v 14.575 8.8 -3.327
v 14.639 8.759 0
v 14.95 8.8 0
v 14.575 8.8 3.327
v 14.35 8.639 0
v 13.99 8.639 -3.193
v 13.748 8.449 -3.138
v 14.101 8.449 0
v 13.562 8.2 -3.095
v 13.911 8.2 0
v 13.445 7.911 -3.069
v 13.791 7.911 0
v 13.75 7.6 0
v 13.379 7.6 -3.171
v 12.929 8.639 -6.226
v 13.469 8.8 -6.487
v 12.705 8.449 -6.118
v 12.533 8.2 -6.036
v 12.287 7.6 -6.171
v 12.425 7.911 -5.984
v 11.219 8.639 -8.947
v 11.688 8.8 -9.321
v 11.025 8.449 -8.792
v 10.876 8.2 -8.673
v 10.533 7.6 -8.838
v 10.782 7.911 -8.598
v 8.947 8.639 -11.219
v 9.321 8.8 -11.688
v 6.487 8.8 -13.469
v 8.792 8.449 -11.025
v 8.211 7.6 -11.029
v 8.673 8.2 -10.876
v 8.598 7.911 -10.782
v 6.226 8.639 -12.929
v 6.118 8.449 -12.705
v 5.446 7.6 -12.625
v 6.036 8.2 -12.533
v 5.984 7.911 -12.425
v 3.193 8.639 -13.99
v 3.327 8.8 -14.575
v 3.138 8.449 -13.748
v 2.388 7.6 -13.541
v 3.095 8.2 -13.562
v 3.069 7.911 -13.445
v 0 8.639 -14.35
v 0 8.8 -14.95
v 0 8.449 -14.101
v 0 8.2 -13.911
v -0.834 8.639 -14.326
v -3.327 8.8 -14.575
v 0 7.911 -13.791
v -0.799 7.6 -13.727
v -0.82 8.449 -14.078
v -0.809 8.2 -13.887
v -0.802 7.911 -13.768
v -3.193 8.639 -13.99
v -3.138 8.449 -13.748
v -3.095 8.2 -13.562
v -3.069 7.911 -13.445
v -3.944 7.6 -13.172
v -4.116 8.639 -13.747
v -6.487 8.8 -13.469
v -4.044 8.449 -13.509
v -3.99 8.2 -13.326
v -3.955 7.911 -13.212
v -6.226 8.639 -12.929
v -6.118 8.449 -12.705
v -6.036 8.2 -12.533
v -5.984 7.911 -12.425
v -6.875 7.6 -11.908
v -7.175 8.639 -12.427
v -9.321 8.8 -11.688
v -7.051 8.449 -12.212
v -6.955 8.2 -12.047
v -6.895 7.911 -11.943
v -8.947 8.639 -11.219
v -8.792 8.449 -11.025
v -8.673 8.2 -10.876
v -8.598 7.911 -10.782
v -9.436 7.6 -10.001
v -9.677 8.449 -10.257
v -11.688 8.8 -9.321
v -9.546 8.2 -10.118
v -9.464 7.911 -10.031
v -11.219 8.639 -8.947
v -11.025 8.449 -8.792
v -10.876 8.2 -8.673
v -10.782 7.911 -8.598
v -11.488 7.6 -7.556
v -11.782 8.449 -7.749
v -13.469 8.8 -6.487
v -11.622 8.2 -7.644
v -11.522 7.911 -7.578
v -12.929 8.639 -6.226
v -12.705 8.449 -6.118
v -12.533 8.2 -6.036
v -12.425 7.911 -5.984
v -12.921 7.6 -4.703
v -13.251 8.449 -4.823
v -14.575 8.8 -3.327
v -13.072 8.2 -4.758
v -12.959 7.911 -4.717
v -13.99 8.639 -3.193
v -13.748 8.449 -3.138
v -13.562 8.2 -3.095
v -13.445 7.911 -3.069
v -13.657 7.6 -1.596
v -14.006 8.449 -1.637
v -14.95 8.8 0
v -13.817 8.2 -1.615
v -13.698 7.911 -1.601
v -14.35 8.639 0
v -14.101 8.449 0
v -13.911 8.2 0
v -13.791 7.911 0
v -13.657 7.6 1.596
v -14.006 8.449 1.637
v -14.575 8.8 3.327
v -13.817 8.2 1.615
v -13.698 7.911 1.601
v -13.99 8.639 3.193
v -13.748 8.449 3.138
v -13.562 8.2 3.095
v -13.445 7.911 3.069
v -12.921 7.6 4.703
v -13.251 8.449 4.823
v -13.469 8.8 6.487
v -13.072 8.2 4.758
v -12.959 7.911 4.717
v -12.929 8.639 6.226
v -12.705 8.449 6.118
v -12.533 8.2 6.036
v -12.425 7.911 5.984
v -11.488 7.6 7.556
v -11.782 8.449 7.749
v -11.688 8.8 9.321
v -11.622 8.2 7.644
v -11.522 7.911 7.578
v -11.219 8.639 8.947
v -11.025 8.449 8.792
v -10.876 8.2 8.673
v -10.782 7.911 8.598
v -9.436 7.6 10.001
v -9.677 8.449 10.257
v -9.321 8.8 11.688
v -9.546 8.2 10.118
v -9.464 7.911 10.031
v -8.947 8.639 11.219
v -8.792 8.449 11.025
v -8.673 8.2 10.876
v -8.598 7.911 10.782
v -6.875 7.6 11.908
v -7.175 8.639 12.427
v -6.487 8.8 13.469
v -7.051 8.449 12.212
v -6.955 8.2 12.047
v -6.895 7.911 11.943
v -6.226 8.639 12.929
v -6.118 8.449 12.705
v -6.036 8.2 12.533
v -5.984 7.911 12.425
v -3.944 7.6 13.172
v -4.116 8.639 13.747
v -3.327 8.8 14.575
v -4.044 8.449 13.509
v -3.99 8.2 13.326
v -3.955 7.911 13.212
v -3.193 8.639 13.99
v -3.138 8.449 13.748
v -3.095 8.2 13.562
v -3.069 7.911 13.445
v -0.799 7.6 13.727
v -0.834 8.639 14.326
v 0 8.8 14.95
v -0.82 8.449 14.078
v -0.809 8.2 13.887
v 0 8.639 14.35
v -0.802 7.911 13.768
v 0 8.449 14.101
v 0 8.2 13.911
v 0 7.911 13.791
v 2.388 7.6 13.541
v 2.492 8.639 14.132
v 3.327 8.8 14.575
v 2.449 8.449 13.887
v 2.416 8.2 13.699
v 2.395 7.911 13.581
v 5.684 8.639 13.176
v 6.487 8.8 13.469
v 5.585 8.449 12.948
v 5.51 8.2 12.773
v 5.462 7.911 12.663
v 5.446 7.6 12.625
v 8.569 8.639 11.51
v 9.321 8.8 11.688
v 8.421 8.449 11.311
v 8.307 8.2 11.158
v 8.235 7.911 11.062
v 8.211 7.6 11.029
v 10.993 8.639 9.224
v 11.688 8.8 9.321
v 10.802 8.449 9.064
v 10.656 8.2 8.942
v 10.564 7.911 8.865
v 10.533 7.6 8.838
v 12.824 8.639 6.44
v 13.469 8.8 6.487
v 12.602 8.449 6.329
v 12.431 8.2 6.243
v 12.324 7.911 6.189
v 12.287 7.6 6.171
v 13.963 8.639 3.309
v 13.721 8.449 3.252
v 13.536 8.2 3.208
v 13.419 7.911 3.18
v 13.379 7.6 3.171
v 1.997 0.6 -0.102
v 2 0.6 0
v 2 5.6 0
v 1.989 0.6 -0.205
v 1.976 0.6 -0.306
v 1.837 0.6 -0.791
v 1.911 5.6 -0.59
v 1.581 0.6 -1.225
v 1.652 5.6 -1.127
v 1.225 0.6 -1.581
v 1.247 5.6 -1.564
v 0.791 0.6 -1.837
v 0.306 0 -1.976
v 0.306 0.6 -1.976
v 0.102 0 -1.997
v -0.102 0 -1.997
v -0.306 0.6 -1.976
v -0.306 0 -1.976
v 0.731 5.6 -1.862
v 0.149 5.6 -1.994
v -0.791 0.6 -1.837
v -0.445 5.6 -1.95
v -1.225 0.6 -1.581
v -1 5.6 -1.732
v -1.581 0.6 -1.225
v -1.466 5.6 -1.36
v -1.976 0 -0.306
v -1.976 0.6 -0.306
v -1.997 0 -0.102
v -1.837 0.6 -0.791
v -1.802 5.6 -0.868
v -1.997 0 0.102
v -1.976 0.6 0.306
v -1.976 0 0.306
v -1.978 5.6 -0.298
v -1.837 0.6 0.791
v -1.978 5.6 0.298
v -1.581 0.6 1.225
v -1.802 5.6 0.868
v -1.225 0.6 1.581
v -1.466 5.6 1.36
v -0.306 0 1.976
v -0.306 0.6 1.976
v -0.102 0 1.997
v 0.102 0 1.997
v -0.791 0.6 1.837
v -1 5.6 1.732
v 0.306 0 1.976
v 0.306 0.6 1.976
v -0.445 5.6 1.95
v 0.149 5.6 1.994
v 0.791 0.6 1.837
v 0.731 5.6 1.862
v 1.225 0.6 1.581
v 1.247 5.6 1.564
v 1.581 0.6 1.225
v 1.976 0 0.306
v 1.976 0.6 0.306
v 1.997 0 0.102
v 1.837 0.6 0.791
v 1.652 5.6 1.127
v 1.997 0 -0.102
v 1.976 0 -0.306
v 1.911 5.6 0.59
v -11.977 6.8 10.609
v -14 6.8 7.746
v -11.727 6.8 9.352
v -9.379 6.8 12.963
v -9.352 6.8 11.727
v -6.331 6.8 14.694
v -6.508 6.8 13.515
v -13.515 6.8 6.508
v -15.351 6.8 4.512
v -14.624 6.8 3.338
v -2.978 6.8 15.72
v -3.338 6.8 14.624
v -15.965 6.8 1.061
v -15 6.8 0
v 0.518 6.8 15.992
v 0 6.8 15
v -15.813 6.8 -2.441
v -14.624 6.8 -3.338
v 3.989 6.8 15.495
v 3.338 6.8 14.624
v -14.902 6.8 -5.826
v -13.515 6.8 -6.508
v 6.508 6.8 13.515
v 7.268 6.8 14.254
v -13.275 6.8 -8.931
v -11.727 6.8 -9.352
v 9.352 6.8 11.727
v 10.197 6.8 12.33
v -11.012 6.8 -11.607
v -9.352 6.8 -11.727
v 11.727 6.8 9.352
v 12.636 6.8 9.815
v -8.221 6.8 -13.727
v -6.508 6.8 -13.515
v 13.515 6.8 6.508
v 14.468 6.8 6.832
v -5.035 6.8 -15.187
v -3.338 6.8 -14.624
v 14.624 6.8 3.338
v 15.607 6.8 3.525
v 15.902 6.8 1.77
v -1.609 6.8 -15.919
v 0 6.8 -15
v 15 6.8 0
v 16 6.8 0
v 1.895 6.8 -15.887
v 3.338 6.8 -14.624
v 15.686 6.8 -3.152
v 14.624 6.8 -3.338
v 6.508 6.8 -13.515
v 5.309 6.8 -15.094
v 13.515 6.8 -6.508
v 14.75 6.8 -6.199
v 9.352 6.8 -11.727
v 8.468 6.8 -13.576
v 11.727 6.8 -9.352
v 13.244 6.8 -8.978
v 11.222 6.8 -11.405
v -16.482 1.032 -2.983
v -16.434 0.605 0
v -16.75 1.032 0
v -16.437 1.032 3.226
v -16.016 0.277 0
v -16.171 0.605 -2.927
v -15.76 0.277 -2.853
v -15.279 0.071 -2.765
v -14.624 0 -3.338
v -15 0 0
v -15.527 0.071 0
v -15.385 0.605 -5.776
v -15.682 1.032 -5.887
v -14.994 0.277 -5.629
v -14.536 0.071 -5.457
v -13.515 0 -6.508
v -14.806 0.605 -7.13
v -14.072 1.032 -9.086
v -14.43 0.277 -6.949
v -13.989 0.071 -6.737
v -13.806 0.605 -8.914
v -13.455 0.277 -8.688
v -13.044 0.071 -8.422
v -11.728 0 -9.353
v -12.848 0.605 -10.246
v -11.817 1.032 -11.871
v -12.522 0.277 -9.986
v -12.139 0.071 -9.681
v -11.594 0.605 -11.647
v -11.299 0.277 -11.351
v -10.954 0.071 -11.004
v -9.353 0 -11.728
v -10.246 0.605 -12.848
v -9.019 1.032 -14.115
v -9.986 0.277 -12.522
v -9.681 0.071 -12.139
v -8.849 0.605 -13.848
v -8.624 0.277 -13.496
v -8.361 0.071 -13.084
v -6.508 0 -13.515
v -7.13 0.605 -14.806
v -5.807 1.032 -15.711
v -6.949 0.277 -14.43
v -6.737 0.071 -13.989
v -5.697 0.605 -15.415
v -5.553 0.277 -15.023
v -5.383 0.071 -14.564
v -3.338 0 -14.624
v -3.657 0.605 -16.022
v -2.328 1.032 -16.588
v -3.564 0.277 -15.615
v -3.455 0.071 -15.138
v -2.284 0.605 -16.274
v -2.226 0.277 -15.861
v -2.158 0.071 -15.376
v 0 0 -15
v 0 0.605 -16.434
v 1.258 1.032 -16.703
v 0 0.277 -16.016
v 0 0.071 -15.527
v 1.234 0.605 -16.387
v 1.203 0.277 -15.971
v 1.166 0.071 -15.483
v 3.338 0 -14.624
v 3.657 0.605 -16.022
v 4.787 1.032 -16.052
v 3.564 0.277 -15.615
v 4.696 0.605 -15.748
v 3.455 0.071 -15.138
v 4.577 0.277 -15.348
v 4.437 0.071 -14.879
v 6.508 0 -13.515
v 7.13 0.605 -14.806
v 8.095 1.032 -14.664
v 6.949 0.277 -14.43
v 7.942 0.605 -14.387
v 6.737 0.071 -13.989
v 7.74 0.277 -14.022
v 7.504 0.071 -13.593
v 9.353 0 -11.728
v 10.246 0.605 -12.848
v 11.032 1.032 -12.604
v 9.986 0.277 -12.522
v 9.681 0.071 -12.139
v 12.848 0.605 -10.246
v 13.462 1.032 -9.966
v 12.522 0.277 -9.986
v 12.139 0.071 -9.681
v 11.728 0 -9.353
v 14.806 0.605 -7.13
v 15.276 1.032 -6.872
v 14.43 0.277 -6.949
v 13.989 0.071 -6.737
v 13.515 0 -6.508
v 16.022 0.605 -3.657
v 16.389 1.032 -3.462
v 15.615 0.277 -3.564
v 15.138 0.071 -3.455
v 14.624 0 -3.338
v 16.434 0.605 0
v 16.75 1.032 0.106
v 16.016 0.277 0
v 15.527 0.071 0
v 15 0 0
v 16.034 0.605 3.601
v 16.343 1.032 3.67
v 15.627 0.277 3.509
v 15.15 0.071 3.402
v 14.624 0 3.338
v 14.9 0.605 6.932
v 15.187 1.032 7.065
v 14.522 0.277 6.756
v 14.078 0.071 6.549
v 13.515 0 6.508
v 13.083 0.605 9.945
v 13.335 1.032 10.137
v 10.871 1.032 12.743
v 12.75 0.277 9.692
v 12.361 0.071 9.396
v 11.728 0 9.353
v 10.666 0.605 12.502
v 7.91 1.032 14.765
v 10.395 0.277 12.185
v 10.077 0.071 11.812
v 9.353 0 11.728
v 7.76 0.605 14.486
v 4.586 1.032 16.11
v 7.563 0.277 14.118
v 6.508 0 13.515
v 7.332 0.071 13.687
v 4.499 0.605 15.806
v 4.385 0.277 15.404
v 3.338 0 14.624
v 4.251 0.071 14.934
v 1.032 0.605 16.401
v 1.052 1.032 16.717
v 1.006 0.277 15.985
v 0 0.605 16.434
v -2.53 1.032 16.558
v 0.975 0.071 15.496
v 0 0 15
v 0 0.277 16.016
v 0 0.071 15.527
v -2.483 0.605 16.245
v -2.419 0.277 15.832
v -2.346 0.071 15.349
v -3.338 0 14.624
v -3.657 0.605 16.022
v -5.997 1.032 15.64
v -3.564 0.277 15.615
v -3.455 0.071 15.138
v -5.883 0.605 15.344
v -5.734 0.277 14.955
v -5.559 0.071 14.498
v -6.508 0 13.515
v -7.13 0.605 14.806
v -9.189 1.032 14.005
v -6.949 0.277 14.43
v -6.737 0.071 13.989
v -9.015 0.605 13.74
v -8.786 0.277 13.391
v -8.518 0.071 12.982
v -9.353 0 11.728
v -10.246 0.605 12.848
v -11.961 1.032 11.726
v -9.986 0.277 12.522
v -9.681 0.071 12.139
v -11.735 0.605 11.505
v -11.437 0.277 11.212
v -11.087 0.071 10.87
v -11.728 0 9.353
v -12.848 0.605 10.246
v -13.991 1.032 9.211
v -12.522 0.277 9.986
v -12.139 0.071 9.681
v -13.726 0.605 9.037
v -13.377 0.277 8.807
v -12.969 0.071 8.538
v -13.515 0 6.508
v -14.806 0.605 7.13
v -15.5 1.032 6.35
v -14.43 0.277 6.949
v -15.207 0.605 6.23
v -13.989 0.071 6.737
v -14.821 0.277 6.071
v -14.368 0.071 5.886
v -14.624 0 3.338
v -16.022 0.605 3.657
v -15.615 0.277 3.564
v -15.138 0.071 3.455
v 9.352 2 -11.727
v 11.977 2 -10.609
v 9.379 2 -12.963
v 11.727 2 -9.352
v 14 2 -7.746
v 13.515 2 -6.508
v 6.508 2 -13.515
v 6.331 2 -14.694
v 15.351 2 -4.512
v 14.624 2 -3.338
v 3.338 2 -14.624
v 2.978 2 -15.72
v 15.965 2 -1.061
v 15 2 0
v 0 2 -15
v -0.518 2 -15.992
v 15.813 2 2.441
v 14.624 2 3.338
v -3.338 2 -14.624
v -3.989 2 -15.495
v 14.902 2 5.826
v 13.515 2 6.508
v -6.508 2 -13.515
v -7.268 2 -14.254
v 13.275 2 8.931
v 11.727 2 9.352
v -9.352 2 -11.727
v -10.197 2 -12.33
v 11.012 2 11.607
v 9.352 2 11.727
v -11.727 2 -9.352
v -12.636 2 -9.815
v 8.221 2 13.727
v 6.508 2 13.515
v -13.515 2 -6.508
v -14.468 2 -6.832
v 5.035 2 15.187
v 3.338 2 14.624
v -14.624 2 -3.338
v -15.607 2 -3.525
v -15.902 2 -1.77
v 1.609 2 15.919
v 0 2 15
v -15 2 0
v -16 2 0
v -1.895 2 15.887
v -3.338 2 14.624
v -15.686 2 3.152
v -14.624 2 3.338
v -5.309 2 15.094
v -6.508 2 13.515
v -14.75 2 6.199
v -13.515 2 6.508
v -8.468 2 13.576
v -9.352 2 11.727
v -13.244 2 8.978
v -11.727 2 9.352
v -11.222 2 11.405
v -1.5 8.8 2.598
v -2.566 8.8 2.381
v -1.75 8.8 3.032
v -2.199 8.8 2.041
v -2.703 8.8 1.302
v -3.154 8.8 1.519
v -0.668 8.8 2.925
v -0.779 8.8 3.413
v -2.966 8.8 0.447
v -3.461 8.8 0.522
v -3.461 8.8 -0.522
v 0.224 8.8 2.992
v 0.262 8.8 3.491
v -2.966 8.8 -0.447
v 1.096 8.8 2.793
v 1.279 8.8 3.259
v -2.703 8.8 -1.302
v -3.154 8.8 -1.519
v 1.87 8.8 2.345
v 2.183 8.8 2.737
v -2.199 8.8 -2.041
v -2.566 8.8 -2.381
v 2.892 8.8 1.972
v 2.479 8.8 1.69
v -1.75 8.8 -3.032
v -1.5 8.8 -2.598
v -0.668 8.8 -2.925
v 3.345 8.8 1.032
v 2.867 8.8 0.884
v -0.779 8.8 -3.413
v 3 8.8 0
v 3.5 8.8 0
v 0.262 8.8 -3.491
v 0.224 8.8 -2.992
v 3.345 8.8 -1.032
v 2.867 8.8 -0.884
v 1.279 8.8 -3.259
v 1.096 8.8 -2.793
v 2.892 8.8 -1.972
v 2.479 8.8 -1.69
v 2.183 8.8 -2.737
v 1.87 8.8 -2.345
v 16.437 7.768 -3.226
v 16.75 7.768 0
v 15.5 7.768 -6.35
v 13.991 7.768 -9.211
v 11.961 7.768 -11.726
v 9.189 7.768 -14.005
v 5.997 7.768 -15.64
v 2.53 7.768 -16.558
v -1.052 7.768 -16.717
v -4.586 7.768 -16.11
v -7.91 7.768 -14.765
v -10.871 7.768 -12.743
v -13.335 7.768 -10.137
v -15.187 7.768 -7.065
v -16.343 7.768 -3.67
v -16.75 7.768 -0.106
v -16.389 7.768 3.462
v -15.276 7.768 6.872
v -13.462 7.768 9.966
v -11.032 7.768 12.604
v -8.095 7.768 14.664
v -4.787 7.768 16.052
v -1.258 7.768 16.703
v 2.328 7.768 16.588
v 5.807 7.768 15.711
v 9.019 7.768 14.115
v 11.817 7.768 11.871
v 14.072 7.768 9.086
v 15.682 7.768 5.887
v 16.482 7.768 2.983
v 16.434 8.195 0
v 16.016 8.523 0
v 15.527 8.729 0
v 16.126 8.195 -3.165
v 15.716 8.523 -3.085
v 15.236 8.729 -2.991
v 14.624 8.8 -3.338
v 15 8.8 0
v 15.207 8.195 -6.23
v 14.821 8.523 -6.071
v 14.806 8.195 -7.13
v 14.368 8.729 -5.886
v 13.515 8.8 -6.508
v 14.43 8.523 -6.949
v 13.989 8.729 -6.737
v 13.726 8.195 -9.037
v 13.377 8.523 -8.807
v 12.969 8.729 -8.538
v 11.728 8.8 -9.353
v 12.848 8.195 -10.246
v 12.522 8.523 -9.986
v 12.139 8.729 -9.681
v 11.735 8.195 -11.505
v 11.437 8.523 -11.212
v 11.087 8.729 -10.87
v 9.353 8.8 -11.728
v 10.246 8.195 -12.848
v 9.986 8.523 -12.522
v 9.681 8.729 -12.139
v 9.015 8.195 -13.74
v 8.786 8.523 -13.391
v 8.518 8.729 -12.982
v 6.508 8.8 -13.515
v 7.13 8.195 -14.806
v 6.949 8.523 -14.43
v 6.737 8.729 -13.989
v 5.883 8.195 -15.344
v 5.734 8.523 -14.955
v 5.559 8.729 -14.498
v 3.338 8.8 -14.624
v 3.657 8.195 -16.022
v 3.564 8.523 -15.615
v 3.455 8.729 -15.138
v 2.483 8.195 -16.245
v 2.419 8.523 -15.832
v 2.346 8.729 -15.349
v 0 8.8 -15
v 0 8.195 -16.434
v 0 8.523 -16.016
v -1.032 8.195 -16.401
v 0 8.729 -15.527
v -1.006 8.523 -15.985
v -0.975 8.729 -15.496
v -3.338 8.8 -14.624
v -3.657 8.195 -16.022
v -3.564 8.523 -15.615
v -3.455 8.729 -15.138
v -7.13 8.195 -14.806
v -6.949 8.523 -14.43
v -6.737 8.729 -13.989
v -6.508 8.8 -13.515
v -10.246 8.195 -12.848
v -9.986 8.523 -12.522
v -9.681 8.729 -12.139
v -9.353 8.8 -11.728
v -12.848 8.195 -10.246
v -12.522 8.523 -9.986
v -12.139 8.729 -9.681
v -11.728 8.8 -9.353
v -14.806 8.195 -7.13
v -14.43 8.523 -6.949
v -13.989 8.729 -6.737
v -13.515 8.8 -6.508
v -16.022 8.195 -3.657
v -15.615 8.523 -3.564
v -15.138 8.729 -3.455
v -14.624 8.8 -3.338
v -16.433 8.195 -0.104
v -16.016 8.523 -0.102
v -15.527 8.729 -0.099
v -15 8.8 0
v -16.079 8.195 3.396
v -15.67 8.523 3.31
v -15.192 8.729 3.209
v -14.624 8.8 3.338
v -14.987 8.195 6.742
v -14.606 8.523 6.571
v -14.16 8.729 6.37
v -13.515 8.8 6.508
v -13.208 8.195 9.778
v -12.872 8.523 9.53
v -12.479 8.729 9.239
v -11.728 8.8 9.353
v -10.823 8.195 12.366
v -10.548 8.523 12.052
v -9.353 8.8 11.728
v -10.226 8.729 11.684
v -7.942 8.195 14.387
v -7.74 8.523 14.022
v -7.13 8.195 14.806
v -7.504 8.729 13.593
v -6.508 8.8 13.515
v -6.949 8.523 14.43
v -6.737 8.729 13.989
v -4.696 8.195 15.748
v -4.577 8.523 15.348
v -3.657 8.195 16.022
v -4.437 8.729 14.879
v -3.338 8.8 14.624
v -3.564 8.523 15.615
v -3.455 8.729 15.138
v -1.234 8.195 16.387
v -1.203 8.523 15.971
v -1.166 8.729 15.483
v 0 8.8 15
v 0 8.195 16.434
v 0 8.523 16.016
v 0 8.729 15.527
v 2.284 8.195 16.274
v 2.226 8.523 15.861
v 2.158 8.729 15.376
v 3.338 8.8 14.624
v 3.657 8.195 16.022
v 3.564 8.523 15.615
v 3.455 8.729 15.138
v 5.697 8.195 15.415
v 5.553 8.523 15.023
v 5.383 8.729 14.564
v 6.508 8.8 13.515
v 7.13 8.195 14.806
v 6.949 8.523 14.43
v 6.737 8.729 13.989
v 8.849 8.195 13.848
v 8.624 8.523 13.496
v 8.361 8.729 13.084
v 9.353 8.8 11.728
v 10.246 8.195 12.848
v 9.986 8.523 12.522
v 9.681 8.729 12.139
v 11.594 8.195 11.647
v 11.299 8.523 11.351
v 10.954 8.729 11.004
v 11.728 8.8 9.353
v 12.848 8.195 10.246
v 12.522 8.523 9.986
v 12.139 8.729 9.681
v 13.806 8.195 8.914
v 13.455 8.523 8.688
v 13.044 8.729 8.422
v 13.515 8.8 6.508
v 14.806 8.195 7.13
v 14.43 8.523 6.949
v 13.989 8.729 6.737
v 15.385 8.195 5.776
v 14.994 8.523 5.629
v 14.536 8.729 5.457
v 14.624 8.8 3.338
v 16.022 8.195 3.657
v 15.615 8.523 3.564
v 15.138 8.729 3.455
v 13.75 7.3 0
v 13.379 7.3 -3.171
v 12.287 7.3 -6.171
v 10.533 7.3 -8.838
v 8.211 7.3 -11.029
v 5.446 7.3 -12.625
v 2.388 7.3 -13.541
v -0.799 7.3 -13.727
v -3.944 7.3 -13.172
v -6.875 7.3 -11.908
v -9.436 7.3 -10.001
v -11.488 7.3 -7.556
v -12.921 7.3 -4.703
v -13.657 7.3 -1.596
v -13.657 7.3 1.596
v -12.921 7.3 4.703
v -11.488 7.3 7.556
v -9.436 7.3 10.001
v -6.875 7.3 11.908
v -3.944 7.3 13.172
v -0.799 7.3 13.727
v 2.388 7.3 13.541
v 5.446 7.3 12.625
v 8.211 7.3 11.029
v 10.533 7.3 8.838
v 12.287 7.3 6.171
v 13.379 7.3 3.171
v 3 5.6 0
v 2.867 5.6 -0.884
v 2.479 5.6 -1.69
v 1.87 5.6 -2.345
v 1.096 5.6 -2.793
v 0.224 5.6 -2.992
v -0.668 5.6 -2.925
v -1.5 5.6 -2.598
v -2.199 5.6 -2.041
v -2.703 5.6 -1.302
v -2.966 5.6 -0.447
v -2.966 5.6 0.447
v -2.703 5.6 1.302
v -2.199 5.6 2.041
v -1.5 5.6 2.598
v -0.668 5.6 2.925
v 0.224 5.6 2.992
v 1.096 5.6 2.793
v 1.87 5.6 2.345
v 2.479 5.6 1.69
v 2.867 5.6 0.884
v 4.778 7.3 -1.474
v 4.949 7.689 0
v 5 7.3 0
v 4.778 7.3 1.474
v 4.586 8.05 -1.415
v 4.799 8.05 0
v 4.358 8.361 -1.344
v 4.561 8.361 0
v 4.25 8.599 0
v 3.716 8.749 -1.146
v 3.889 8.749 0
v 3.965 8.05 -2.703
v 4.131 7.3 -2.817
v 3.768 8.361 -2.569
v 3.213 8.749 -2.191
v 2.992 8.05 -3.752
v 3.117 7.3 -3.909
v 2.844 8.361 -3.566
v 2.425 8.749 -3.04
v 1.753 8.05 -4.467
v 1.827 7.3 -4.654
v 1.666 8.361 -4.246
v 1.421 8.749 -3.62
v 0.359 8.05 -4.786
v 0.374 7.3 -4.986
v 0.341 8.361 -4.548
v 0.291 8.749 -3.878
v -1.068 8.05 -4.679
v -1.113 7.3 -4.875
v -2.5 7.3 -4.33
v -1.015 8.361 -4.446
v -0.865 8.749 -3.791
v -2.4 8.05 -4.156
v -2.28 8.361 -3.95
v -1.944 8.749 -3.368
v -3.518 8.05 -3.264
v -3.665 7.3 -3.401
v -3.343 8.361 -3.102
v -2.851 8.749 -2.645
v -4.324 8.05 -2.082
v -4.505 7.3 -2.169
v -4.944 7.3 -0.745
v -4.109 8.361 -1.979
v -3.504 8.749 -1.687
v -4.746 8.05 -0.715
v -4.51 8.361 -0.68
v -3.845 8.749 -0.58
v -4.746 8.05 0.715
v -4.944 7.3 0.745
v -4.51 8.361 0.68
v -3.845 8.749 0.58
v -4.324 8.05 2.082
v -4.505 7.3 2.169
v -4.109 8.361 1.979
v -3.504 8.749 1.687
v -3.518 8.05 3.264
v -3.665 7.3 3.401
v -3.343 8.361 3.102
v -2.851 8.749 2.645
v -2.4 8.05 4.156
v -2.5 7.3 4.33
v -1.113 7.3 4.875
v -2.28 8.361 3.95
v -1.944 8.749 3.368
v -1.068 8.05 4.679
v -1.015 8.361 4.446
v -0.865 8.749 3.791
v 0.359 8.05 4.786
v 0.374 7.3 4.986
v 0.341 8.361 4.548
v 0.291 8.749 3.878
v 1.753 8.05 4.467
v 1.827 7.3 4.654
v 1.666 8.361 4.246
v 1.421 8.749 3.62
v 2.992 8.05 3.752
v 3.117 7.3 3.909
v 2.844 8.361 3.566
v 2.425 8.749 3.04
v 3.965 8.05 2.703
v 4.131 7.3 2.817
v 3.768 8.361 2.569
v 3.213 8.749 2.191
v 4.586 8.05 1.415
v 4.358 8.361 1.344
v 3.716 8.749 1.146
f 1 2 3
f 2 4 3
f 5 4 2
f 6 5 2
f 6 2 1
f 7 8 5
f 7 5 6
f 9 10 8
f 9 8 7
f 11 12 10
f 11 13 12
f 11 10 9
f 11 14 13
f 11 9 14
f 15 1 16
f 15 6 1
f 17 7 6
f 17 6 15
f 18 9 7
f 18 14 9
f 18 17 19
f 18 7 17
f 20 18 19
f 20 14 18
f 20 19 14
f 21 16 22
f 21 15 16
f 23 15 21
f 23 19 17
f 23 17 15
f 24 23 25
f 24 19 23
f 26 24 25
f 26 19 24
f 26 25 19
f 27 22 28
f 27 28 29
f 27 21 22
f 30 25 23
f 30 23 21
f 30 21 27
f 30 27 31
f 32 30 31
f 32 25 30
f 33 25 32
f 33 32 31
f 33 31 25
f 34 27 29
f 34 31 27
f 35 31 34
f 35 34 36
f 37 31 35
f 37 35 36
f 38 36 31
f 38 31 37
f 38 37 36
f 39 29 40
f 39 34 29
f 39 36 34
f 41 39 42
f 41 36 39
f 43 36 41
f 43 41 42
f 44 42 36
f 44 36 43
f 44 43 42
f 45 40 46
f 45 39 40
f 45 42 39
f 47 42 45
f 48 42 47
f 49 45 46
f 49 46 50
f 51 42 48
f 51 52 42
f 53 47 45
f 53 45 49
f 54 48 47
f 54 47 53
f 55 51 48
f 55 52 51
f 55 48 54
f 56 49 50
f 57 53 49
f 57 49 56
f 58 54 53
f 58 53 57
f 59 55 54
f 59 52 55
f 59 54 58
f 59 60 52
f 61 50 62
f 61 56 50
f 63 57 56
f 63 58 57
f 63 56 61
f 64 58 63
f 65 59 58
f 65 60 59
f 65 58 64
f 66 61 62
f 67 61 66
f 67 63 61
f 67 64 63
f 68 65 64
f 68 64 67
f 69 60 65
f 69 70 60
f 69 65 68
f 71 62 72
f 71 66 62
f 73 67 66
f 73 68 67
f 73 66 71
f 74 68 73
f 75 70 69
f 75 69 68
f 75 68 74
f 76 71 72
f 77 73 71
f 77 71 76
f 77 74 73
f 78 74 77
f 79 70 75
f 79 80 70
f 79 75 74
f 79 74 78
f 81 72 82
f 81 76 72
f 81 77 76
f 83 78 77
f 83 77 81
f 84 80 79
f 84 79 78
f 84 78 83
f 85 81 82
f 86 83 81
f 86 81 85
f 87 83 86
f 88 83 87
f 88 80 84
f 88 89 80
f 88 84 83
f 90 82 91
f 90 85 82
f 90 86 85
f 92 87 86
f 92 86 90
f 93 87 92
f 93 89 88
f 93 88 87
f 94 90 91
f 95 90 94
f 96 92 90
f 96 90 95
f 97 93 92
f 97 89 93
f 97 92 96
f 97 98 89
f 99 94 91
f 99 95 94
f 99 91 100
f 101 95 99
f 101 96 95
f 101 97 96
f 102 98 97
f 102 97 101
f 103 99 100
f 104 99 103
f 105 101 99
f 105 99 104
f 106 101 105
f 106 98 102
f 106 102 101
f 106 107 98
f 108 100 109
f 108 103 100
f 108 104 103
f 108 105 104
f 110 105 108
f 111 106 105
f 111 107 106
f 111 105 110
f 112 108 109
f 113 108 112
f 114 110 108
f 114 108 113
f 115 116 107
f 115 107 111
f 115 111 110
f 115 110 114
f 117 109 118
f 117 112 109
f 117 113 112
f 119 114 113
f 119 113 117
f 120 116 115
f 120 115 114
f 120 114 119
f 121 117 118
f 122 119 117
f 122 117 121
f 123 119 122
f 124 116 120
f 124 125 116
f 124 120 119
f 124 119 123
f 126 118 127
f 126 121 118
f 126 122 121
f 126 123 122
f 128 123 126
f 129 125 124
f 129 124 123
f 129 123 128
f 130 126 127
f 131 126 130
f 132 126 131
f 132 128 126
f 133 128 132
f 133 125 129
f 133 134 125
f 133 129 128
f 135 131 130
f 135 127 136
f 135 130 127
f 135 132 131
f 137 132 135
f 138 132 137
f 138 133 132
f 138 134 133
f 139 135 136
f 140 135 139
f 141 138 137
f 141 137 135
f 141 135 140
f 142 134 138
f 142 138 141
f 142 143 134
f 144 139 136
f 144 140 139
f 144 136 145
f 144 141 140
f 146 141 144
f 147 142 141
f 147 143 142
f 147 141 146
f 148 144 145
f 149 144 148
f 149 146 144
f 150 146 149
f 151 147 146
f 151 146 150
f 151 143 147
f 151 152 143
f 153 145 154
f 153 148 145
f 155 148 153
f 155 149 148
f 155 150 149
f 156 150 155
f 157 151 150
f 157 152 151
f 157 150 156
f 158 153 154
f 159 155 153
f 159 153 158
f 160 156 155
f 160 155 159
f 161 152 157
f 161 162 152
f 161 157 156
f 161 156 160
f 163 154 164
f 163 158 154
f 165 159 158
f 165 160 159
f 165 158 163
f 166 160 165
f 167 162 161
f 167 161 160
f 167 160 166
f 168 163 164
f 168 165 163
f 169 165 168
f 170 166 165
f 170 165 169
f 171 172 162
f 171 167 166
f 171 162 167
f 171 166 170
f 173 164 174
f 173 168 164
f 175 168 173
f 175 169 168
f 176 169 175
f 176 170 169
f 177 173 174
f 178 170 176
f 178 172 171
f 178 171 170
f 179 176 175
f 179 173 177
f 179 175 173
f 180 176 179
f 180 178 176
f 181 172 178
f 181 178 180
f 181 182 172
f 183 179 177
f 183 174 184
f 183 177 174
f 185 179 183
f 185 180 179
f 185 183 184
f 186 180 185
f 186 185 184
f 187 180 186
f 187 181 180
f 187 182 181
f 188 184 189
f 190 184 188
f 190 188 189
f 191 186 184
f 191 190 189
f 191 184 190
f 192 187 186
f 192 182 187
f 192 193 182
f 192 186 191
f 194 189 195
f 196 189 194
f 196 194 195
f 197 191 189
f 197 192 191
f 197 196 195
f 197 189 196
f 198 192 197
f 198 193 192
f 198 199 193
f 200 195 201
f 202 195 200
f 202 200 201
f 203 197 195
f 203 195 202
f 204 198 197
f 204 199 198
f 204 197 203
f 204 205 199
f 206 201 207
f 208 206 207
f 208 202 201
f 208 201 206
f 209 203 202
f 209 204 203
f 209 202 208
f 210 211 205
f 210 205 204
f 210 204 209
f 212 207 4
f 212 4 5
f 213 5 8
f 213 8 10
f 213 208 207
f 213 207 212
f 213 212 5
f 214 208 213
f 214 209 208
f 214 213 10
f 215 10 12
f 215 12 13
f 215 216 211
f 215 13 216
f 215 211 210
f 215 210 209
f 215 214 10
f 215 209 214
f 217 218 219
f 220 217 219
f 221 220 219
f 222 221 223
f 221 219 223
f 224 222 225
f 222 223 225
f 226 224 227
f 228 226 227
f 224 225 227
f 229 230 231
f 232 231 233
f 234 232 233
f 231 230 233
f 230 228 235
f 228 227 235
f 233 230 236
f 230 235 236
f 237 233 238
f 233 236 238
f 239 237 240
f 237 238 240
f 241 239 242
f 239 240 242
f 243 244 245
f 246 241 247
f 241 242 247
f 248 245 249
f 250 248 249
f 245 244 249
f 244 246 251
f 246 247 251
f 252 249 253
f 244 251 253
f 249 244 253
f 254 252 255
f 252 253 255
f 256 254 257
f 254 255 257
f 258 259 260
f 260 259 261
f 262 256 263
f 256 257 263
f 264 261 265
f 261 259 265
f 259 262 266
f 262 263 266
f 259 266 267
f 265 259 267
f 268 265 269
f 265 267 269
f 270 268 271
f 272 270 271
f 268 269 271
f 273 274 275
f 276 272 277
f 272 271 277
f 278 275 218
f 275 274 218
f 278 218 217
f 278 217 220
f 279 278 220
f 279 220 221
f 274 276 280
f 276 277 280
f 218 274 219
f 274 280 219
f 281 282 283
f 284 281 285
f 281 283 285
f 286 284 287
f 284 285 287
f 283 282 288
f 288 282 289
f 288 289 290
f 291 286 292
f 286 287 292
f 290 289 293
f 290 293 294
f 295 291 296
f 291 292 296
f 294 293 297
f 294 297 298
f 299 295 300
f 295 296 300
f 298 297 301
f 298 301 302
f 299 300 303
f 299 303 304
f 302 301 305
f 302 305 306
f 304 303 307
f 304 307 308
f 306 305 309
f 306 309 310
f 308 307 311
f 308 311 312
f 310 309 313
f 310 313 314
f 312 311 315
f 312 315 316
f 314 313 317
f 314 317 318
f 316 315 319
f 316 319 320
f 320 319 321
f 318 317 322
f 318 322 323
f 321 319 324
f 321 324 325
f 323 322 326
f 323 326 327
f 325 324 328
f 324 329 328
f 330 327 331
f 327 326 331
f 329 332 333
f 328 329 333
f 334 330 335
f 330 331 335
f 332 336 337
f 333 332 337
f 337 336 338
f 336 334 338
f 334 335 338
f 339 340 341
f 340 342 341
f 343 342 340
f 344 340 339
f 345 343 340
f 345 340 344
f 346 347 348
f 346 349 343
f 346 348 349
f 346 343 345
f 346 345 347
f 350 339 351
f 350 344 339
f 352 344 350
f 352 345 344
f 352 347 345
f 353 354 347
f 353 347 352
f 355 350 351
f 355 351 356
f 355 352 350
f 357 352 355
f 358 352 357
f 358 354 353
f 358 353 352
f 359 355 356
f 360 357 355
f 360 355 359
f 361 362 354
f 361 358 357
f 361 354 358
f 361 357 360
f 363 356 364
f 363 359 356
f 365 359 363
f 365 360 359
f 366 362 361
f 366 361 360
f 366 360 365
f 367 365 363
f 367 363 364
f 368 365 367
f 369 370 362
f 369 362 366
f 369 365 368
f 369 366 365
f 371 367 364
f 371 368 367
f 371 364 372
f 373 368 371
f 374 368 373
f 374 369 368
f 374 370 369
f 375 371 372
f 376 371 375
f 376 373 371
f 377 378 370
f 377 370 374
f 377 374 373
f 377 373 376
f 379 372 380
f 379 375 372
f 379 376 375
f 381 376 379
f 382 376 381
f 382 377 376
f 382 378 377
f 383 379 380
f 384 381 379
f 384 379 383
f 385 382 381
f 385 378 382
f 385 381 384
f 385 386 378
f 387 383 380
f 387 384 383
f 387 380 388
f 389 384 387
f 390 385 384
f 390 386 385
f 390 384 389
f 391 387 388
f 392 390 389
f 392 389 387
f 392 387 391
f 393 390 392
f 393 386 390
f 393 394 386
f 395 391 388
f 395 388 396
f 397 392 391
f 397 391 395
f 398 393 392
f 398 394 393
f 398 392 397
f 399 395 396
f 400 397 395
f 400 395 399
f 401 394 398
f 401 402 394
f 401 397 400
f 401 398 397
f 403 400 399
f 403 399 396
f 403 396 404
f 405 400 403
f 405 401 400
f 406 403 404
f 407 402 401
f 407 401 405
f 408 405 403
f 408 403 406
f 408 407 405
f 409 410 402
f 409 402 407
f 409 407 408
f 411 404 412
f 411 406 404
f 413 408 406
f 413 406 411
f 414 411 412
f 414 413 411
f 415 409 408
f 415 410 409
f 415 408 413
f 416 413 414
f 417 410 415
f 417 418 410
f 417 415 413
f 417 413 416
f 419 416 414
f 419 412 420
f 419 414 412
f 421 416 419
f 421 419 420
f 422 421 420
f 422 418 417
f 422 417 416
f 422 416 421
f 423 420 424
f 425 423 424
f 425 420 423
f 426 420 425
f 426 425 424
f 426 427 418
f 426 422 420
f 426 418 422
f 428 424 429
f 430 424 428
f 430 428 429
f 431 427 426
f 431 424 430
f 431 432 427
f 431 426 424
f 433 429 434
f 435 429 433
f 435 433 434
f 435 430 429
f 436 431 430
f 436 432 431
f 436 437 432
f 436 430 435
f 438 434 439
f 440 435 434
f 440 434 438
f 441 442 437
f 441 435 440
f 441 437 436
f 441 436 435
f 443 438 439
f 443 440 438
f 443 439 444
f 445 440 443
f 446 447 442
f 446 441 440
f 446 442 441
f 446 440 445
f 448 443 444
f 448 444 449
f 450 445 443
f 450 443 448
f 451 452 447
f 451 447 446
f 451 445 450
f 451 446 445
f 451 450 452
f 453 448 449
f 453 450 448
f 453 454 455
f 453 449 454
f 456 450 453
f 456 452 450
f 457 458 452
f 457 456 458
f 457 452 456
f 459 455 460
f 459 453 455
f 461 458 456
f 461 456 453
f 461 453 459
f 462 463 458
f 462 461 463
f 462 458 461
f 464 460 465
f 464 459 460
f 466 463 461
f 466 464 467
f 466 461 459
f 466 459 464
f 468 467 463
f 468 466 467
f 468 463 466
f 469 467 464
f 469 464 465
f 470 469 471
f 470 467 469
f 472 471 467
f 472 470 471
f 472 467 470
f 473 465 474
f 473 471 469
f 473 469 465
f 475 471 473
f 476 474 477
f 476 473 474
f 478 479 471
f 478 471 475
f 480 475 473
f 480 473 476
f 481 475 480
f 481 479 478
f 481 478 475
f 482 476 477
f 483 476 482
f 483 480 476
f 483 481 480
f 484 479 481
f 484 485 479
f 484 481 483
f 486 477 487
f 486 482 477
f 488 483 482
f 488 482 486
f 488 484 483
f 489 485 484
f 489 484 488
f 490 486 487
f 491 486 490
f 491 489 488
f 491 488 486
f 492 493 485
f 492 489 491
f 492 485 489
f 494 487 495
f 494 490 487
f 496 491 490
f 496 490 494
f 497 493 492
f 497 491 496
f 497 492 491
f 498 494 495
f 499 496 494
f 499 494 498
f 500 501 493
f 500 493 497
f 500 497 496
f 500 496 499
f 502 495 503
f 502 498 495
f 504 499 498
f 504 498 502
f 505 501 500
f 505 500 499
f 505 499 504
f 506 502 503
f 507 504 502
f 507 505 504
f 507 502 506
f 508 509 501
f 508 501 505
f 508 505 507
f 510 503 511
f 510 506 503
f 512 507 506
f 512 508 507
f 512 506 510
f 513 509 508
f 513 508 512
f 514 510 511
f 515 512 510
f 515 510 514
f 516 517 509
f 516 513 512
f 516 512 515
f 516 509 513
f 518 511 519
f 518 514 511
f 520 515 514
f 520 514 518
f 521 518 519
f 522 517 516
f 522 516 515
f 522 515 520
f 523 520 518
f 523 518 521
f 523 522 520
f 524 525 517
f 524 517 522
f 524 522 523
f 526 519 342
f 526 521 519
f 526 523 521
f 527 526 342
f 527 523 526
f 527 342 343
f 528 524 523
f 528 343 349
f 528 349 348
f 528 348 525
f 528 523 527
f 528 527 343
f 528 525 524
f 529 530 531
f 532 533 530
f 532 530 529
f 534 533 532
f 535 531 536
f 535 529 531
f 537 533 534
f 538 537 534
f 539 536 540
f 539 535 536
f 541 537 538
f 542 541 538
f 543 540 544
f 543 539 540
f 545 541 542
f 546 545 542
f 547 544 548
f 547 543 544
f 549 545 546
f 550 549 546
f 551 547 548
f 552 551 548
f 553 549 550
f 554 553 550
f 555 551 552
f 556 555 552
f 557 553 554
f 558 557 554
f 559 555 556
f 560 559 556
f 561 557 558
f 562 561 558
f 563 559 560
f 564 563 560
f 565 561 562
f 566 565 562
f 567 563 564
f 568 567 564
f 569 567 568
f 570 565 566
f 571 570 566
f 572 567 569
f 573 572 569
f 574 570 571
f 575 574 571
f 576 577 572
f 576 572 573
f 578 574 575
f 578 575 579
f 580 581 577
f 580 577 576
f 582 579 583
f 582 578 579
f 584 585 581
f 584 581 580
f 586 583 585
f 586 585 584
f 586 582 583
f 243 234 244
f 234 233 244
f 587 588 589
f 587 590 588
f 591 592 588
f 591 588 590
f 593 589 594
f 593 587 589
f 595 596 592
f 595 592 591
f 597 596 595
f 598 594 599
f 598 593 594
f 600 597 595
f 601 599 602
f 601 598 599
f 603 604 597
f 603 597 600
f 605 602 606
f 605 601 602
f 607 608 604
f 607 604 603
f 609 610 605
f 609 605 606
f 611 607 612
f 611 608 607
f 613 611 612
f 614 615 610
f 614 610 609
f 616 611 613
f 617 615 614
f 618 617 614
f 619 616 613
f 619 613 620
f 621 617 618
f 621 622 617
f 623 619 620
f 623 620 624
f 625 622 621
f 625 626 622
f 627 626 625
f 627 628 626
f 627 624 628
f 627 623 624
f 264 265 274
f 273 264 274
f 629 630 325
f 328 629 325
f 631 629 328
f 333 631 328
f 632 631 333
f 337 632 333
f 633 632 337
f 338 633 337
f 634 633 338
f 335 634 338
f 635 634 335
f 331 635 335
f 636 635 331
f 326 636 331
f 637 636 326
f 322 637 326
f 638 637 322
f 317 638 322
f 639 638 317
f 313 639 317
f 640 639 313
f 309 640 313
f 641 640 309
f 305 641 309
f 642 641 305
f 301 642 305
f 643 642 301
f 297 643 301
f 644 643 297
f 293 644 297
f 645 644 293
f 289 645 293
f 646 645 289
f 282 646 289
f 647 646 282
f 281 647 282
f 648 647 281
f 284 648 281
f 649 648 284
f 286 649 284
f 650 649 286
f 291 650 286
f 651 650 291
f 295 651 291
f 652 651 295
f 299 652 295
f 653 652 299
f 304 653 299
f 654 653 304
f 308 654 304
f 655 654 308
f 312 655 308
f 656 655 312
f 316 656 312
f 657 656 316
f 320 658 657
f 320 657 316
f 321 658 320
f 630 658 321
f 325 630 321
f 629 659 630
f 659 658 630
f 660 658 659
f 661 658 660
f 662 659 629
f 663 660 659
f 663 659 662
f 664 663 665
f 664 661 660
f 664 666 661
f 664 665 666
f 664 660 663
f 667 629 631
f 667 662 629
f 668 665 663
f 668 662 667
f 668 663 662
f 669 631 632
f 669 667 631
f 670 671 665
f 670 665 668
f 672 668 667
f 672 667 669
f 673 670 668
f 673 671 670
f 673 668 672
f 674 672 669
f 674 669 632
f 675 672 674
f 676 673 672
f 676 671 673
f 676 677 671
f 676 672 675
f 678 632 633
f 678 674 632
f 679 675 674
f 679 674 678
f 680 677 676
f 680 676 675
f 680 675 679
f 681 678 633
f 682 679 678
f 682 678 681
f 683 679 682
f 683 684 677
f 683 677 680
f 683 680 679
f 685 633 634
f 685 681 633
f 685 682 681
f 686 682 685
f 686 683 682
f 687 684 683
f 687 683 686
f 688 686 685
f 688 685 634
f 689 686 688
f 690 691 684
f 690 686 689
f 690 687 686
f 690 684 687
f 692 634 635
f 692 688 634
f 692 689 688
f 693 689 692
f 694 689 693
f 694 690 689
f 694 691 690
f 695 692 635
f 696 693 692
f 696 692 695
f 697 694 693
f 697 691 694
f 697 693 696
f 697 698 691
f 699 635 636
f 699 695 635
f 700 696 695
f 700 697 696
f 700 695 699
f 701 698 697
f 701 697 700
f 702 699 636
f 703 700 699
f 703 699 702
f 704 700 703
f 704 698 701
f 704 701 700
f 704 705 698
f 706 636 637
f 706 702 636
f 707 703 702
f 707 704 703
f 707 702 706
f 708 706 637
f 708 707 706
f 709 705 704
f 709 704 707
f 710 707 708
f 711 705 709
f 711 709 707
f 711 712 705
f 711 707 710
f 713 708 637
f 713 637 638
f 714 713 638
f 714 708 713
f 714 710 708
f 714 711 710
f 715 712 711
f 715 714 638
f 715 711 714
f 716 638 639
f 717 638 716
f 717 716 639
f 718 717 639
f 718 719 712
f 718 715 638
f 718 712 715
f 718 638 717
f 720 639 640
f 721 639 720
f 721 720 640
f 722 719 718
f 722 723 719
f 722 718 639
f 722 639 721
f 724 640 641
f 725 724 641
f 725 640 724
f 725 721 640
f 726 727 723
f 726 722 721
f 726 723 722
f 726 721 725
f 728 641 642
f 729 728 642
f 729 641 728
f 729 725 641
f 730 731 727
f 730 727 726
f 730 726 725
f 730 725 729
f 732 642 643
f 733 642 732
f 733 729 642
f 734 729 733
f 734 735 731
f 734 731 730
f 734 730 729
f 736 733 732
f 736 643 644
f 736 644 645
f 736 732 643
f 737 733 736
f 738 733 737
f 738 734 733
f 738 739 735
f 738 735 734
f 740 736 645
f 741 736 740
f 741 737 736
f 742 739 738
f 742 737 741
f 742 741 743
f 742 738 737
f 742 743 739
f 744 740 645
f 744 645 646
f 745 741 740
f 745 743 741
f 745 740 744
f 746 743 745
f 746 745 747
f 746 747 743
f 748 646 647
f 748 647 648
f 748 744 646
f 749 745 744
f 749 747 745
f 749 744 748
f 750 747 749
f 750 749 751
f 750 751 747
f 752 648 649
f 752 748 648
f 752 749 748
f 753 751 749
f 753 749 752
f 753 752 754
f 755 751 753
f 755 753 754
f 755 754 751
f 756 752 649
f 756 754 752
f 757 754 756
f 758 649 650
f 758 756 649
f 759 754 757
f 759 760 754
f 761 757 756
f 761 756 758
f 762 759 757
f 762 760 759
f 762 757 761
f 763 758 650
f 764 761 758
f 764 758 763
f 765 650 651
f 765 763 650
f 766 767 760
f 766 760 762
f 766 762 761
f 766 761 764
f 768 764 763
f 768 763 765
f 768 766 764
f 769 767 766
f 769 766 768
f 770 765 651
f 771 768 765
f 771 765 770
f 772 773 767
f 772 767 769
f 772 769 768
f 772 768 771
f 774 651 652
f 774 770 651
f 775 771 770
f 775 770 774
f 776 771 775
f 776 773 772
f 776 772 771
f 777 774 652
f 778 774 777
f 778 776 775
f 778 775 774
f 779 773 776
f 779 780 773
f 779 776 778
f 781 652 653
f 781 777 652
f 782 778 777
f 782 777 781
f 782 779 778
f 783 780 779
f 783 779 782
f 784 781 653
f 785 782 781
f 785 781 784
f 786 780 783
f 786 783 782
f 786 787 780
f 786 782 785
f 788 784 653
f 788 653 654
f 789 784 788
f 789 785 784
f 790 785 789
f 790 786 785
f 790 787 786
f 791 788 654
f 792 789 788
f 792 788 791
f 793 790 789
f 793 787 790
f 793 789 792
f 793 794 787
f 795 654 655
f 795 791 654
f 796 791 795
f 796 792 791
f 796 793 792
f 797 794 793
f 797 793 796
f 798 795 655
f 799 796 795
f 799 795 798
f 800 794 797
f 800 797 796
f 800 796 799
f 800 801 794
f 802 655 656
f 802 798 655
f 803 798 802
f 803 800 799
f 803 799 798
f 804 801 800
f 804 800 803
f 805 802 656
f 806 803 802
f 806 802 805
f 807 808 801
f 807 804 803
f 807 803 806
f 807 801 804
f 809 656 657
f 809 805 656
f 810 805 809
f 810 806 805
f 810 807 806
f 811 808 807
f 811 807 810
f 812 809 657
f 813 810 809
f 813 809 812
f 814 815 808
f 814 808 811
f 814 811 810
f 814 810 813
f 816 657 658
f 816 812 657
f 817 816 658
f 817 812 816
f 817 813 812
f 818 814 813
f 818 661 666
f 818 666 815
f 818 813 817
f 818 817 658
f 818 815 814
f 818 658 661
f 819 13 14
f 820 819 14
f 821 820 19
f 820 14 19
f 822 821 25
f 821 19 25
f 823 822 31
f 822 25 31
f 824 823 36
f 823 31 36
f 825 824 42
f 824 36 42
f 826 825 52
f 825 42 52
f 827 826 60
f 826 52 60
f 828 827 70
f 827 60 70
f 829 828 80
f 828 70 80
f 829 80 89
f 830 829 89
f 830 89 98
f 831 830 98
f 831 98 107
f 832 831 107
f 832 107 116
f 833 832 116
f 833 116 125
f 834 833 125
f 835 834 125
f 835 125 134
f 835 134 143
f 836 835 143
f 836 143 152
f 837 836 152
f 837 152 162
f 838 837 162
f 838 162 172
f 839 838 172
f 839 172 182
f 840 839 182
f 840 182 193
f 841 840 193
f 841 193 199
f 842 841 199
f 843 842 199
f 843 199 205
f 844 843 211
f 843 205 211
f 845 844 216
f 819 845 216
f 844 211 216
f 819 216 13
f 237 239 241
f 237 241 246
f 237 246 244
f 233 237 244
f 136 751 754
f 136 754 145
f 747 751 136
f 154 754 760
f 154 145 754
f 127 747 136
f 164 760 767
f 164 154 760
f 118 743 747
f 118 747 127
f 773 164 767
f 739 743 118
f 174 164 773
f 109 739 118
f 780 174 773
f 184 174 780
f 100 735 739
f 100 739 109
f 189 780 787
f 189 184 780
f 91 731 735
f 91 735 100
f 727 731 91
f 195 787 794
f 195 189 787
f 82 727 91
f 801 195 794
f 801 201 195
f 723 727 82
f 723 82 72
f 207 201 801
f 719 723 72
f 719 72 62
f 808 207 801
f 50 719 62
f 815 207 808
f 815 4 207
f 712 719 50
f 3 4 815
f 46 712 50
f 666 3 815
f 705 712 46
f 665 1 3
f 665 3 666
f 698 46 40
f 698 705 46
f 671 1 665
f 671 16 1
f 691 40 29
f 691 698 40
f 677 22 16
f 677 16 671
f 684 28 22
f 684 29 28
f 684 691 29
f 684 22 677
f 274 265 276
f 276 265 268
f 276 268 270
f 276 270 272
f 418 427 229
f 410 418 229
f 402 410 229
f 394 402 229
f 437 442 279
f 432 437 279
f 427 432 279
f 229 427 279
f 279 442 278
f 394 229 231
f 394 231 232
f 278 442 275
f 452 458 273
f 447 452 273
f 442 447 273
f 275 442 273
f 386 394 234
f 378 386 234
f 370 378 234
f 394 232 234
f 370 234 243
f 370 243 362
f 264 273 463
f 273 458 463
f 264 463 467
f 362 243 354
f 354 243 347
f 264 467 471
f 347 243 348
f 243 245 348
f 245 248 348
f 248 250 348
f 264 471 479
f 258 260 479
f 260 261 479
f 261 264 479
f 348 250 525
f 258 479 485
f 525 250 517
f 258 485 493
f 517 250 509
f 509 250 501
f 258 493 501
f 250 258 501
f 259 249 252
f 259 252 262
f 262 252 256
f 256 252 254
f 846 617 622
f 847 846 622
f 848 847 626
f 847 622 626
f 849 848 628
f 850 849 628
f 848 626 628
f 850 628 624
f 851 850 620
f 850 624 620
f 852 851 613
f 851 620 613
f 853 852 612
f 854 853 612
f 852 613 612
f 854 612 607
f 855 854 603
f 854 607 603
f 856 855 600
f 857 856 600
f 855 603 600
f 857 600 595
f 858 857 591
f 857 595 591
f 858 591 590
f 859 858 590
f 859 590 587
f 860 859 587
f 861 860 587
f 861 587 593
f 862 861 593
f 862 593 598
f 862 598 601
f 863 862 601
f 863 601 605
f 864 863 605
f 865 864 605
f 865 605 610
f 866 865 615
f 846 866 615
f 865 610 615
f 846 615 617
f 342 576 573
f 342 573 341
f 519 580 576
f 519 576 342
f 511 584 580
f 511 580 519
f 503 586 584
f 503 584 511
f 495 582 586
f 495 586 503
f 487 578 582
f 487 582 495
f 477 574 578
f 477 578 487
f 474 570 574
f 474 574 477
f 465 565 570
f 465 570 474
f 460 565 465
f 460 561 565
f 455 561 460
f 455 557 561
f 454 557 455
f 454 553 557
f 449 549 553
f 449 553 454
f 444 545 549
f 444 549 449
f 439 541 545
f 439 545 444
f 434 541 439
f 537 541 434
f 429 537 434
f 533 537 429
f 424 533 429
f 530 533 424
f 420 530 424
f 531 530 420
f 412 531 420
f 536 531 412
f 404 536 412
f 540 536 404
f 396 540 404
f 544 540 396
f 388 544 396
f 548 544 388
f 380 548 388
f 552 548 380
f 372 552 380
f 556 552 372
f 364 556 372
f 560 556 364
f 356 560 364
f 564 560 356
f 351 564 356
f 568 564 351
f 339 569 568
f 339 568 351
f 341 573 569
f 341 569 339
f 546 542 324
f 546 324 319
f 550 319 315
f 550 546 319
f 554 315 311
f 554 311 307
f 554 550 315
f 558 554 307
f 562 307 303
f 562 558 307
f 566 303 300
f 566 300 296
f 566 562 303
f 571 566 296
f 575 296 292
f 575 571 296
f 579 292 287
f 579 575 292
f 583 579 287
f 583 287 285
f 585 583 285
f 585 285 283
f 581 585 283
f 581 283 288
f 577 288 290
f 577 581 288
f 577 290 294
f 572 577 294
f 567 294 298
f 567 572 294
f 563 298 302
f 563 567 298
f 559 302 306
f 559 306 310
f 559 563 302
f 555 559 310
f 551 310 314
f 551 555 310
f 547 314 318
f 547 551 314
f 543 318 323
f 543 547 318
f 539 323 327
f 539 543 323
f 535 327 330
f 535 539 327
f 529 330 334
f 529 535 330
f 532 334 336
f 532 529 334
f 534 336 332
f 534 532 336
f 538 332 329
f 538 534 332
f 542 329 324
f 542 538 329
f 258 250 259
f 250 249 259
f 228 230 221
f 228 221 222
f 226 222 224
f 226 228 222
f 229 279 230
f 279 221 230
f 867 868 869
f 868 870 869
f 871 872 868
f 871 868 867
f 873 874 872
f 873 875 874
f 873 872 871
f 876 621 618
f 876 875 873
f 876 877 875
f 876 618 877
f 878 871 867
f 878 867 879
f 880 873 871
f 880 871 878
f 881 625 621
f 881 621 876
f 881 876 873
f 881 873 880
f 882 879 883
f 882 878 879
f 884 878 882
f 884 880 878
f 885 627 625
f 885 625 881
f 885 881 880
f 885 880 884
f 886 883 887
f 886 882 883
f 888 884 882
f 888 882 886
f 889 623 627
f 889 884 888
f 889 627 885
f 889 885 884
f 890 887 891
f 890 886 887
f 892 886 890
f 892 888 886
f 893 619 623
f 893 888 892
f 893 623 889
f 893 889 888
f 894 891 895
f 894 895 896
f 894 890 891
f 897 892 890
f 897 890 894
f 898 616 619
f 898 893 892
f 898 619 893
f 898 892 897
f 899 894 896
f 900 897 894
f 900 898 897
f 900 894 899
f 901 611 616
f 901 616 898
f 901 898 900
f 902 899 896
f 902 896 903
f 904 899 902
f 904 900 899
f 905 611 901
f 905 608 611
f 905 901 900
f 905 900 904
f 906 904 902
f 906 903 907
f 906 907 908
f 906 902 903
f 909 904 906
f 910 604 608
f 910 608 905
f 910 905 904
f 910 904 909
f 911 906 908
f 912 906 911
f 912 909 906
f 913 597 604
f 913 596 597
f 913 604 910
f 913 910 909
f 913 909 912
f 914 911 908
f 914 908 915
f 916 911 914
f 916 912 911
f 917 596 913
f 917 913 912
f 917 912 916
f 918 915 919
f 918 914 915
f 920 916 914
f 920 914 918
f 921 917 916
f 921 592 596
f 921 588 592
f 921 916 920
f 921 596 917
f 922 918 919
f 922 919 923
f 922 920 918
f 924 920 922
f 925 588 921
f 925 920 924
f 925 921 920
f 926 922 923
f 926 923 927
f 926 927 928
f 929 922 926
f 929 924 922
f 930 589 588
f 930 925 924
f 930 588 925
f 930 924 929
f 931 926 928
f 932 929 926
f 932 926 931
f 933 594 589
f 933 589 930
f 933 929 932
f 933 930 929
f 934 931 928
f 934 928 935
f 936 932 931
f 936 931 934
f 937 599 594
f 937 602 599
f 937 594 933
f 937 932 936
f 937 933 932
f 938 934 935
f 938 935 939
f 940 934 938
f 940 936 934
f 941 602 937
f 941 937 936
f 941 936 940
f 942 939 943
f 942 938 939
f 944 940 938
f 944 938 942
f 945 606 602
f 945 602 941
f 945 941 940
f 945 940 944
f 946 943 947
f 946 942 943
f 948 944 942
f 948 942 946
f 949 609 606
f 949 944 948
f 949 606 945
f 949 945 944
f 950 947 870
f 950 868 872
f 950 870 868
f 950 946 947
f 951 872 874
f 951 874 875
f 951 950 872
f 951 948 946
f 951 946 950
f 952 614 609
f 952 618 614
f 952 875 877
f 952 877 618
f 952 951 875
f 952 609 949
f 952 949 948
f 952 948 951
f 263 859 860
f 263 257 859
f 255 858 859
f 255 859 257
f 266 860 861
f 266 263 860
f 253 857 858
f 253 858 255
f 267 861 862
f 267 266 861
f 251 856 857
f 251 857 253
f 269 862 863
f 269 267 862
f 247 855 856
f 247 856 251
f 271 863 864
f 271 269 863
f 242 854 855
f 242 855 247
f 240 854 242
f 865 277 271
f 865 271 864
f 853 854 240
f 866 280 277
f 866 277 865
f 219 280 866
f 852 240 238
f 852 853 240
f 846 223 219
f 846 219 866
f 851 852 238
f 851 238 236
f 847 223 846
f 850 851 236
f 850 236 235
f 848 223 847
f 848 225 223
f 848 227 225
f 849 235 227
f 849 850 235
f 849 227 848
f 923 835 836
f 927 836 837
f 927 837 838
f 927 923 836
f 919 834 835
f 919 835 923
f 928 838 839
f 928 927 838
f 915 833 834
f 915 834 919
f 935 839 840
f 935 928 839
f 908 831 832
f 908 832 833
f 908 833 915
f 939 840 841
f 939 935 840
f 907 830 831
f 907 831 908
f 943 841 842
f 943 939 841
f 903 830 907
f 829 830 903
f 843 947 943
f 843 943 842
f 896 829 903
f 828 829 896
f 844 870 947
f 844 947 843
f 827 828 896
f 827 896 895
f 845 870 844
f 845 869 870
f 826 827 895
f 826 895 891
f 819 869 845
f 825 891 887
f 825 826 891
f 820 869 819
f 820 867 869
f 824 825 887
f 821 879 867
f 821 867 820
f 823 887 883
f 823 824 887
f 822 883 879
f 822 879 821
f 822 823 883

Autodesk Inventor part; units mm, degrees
ref_plane "YZ Plane" through (0, 0, 0) normal (1, 0, 0) x (0, 1, 0)
ref_plane "XZ Plane" through (0, 0, 0) normal (0, 1, 0) x (-1, 0, 0)
ref_plane "XY Plane" through (0, 0, 0) normal (0, 0, 1) x (1, 0, 0)
sketch "Sketch1" plane through (0, 0, 0) normal (0, 1, 0) x (-1, 0, 0)
  line L0 (0, 0) -> (17, 0)
  circle A0 centre (0, 0) radius 17
  dimension "d0" = 17
extrude "Extrusion1" add sketch "Sketch1" along normal blind 2
sketch "Sketch2" plane through (0, 2, 0) normal (0, 1, 0) x (1, 0, 0)
  line L0 (0, 0) -> (-15, 0)
  circle A0 centre (0, 0) radius 15
  dimension "d3" = 15
extrude "Extrusion2" add sketch "Sketch2" along normal blind 4.8
sketch "Sketch3" plane through (0, 6.8, 0) normal (0, 1, 0) x (1, 0, 0)
  circle A0 centre (0, 0) radius 17
extrude "Extrusion3" add sketch "Sketch3" along normal blind 2
fillet "Fillet1" radius 2 2 edges at (-17, 8.8, 0) (17, 0, 0)
chamfer "Chamfer1" distance 1 angle 45 4 edges at (-17, 6.8005, 0) (-17, 6.8, 0) (17, 2, 0) (17, 1.9995, 0)
sketch "Sketch4" plane through (0, 8.8, 0) normal (0, 1, 0) x (1, 0, 0)
  circle A0 centre (0, 0) radius 13.75
  circle A1 centre (0, 0) radius 5
  dimension "d12" = 27.5
  dimension "d13" = 10
extrude "Extrusion4" cut sketch "Sketch4" against normal blind 1.5
fillet "Fillet2" radius 1.2 1 edges at (-13.75, 8.8, 0)
fillet "Fillet3" radius 1.5 1 edges at (-5, 8.8, 0)
sketch "Sketch5" plane through (0, 8.8, 0) normal (0, 1, 0) x (1, 0, 0)
  circle A0 centre (0, 0) radius 3.5 projected
  circle A1 centre (0, 0) radius 3
  dimension "d18" = 6
extrude "Extrusion5" cut sketch "Sketch5" against normal blind 3.2 contours A1
sketch "Sketch6" plane through (0, 5.6, 0) normal (0, 1, 0) x (1, 0, 0)
  circle A0 centre (0, 0) radius 2
  dimension "d21" = 4
extrude "Extrusion6" cut sketch "Sketch6" against normal blind 5
sketch "Sketch7" plane through (0, 0.6, 0) normal (0, 1, 0) x (1, 0, 0)
  circle A0 centre (0, 0) radius 2 projected
  line L0 (0, -2) -> (-2, 0)
  line L1 (-2, 0) -> (0, 2)
  line L2 (0, 2) -> (2, 0)
  line L3 (2, 0) -> (0, -2)
  line L4 (0, 2.2828) -> (-2.2828, 0)
  line L5 (-2.2828, 0) -> (0, -2.2828)
  line L6 (0, -2.2828) -> (2.2828, 0)
  line L7 (2.2828, 0) -> (0, 2.2828)
  point P0 (1.9764, 0.3065)
  point P1 (0.3065, 1.9764)
  point P2 (0.3065, -1.9764)
  point P3 (1.9764, -0.3065)
  point P4 (-0.3065, 1.9764)
  point P5 (-1.9764, 0.3065)
  point P6 (-1.9764, -0.3065)
  point P7 (-0.3065, -1.9764)
  dimension "d26" = 0.2
extrude "Extrusion7" cut sketch "Sketch7" against normal blind 5 contours L2 A0 L7 | L3 L0 L1 L2 | A0 L6 L3 | L1 A0 L4 | A0 L5 L0
properties part number "kolo_mensi"
